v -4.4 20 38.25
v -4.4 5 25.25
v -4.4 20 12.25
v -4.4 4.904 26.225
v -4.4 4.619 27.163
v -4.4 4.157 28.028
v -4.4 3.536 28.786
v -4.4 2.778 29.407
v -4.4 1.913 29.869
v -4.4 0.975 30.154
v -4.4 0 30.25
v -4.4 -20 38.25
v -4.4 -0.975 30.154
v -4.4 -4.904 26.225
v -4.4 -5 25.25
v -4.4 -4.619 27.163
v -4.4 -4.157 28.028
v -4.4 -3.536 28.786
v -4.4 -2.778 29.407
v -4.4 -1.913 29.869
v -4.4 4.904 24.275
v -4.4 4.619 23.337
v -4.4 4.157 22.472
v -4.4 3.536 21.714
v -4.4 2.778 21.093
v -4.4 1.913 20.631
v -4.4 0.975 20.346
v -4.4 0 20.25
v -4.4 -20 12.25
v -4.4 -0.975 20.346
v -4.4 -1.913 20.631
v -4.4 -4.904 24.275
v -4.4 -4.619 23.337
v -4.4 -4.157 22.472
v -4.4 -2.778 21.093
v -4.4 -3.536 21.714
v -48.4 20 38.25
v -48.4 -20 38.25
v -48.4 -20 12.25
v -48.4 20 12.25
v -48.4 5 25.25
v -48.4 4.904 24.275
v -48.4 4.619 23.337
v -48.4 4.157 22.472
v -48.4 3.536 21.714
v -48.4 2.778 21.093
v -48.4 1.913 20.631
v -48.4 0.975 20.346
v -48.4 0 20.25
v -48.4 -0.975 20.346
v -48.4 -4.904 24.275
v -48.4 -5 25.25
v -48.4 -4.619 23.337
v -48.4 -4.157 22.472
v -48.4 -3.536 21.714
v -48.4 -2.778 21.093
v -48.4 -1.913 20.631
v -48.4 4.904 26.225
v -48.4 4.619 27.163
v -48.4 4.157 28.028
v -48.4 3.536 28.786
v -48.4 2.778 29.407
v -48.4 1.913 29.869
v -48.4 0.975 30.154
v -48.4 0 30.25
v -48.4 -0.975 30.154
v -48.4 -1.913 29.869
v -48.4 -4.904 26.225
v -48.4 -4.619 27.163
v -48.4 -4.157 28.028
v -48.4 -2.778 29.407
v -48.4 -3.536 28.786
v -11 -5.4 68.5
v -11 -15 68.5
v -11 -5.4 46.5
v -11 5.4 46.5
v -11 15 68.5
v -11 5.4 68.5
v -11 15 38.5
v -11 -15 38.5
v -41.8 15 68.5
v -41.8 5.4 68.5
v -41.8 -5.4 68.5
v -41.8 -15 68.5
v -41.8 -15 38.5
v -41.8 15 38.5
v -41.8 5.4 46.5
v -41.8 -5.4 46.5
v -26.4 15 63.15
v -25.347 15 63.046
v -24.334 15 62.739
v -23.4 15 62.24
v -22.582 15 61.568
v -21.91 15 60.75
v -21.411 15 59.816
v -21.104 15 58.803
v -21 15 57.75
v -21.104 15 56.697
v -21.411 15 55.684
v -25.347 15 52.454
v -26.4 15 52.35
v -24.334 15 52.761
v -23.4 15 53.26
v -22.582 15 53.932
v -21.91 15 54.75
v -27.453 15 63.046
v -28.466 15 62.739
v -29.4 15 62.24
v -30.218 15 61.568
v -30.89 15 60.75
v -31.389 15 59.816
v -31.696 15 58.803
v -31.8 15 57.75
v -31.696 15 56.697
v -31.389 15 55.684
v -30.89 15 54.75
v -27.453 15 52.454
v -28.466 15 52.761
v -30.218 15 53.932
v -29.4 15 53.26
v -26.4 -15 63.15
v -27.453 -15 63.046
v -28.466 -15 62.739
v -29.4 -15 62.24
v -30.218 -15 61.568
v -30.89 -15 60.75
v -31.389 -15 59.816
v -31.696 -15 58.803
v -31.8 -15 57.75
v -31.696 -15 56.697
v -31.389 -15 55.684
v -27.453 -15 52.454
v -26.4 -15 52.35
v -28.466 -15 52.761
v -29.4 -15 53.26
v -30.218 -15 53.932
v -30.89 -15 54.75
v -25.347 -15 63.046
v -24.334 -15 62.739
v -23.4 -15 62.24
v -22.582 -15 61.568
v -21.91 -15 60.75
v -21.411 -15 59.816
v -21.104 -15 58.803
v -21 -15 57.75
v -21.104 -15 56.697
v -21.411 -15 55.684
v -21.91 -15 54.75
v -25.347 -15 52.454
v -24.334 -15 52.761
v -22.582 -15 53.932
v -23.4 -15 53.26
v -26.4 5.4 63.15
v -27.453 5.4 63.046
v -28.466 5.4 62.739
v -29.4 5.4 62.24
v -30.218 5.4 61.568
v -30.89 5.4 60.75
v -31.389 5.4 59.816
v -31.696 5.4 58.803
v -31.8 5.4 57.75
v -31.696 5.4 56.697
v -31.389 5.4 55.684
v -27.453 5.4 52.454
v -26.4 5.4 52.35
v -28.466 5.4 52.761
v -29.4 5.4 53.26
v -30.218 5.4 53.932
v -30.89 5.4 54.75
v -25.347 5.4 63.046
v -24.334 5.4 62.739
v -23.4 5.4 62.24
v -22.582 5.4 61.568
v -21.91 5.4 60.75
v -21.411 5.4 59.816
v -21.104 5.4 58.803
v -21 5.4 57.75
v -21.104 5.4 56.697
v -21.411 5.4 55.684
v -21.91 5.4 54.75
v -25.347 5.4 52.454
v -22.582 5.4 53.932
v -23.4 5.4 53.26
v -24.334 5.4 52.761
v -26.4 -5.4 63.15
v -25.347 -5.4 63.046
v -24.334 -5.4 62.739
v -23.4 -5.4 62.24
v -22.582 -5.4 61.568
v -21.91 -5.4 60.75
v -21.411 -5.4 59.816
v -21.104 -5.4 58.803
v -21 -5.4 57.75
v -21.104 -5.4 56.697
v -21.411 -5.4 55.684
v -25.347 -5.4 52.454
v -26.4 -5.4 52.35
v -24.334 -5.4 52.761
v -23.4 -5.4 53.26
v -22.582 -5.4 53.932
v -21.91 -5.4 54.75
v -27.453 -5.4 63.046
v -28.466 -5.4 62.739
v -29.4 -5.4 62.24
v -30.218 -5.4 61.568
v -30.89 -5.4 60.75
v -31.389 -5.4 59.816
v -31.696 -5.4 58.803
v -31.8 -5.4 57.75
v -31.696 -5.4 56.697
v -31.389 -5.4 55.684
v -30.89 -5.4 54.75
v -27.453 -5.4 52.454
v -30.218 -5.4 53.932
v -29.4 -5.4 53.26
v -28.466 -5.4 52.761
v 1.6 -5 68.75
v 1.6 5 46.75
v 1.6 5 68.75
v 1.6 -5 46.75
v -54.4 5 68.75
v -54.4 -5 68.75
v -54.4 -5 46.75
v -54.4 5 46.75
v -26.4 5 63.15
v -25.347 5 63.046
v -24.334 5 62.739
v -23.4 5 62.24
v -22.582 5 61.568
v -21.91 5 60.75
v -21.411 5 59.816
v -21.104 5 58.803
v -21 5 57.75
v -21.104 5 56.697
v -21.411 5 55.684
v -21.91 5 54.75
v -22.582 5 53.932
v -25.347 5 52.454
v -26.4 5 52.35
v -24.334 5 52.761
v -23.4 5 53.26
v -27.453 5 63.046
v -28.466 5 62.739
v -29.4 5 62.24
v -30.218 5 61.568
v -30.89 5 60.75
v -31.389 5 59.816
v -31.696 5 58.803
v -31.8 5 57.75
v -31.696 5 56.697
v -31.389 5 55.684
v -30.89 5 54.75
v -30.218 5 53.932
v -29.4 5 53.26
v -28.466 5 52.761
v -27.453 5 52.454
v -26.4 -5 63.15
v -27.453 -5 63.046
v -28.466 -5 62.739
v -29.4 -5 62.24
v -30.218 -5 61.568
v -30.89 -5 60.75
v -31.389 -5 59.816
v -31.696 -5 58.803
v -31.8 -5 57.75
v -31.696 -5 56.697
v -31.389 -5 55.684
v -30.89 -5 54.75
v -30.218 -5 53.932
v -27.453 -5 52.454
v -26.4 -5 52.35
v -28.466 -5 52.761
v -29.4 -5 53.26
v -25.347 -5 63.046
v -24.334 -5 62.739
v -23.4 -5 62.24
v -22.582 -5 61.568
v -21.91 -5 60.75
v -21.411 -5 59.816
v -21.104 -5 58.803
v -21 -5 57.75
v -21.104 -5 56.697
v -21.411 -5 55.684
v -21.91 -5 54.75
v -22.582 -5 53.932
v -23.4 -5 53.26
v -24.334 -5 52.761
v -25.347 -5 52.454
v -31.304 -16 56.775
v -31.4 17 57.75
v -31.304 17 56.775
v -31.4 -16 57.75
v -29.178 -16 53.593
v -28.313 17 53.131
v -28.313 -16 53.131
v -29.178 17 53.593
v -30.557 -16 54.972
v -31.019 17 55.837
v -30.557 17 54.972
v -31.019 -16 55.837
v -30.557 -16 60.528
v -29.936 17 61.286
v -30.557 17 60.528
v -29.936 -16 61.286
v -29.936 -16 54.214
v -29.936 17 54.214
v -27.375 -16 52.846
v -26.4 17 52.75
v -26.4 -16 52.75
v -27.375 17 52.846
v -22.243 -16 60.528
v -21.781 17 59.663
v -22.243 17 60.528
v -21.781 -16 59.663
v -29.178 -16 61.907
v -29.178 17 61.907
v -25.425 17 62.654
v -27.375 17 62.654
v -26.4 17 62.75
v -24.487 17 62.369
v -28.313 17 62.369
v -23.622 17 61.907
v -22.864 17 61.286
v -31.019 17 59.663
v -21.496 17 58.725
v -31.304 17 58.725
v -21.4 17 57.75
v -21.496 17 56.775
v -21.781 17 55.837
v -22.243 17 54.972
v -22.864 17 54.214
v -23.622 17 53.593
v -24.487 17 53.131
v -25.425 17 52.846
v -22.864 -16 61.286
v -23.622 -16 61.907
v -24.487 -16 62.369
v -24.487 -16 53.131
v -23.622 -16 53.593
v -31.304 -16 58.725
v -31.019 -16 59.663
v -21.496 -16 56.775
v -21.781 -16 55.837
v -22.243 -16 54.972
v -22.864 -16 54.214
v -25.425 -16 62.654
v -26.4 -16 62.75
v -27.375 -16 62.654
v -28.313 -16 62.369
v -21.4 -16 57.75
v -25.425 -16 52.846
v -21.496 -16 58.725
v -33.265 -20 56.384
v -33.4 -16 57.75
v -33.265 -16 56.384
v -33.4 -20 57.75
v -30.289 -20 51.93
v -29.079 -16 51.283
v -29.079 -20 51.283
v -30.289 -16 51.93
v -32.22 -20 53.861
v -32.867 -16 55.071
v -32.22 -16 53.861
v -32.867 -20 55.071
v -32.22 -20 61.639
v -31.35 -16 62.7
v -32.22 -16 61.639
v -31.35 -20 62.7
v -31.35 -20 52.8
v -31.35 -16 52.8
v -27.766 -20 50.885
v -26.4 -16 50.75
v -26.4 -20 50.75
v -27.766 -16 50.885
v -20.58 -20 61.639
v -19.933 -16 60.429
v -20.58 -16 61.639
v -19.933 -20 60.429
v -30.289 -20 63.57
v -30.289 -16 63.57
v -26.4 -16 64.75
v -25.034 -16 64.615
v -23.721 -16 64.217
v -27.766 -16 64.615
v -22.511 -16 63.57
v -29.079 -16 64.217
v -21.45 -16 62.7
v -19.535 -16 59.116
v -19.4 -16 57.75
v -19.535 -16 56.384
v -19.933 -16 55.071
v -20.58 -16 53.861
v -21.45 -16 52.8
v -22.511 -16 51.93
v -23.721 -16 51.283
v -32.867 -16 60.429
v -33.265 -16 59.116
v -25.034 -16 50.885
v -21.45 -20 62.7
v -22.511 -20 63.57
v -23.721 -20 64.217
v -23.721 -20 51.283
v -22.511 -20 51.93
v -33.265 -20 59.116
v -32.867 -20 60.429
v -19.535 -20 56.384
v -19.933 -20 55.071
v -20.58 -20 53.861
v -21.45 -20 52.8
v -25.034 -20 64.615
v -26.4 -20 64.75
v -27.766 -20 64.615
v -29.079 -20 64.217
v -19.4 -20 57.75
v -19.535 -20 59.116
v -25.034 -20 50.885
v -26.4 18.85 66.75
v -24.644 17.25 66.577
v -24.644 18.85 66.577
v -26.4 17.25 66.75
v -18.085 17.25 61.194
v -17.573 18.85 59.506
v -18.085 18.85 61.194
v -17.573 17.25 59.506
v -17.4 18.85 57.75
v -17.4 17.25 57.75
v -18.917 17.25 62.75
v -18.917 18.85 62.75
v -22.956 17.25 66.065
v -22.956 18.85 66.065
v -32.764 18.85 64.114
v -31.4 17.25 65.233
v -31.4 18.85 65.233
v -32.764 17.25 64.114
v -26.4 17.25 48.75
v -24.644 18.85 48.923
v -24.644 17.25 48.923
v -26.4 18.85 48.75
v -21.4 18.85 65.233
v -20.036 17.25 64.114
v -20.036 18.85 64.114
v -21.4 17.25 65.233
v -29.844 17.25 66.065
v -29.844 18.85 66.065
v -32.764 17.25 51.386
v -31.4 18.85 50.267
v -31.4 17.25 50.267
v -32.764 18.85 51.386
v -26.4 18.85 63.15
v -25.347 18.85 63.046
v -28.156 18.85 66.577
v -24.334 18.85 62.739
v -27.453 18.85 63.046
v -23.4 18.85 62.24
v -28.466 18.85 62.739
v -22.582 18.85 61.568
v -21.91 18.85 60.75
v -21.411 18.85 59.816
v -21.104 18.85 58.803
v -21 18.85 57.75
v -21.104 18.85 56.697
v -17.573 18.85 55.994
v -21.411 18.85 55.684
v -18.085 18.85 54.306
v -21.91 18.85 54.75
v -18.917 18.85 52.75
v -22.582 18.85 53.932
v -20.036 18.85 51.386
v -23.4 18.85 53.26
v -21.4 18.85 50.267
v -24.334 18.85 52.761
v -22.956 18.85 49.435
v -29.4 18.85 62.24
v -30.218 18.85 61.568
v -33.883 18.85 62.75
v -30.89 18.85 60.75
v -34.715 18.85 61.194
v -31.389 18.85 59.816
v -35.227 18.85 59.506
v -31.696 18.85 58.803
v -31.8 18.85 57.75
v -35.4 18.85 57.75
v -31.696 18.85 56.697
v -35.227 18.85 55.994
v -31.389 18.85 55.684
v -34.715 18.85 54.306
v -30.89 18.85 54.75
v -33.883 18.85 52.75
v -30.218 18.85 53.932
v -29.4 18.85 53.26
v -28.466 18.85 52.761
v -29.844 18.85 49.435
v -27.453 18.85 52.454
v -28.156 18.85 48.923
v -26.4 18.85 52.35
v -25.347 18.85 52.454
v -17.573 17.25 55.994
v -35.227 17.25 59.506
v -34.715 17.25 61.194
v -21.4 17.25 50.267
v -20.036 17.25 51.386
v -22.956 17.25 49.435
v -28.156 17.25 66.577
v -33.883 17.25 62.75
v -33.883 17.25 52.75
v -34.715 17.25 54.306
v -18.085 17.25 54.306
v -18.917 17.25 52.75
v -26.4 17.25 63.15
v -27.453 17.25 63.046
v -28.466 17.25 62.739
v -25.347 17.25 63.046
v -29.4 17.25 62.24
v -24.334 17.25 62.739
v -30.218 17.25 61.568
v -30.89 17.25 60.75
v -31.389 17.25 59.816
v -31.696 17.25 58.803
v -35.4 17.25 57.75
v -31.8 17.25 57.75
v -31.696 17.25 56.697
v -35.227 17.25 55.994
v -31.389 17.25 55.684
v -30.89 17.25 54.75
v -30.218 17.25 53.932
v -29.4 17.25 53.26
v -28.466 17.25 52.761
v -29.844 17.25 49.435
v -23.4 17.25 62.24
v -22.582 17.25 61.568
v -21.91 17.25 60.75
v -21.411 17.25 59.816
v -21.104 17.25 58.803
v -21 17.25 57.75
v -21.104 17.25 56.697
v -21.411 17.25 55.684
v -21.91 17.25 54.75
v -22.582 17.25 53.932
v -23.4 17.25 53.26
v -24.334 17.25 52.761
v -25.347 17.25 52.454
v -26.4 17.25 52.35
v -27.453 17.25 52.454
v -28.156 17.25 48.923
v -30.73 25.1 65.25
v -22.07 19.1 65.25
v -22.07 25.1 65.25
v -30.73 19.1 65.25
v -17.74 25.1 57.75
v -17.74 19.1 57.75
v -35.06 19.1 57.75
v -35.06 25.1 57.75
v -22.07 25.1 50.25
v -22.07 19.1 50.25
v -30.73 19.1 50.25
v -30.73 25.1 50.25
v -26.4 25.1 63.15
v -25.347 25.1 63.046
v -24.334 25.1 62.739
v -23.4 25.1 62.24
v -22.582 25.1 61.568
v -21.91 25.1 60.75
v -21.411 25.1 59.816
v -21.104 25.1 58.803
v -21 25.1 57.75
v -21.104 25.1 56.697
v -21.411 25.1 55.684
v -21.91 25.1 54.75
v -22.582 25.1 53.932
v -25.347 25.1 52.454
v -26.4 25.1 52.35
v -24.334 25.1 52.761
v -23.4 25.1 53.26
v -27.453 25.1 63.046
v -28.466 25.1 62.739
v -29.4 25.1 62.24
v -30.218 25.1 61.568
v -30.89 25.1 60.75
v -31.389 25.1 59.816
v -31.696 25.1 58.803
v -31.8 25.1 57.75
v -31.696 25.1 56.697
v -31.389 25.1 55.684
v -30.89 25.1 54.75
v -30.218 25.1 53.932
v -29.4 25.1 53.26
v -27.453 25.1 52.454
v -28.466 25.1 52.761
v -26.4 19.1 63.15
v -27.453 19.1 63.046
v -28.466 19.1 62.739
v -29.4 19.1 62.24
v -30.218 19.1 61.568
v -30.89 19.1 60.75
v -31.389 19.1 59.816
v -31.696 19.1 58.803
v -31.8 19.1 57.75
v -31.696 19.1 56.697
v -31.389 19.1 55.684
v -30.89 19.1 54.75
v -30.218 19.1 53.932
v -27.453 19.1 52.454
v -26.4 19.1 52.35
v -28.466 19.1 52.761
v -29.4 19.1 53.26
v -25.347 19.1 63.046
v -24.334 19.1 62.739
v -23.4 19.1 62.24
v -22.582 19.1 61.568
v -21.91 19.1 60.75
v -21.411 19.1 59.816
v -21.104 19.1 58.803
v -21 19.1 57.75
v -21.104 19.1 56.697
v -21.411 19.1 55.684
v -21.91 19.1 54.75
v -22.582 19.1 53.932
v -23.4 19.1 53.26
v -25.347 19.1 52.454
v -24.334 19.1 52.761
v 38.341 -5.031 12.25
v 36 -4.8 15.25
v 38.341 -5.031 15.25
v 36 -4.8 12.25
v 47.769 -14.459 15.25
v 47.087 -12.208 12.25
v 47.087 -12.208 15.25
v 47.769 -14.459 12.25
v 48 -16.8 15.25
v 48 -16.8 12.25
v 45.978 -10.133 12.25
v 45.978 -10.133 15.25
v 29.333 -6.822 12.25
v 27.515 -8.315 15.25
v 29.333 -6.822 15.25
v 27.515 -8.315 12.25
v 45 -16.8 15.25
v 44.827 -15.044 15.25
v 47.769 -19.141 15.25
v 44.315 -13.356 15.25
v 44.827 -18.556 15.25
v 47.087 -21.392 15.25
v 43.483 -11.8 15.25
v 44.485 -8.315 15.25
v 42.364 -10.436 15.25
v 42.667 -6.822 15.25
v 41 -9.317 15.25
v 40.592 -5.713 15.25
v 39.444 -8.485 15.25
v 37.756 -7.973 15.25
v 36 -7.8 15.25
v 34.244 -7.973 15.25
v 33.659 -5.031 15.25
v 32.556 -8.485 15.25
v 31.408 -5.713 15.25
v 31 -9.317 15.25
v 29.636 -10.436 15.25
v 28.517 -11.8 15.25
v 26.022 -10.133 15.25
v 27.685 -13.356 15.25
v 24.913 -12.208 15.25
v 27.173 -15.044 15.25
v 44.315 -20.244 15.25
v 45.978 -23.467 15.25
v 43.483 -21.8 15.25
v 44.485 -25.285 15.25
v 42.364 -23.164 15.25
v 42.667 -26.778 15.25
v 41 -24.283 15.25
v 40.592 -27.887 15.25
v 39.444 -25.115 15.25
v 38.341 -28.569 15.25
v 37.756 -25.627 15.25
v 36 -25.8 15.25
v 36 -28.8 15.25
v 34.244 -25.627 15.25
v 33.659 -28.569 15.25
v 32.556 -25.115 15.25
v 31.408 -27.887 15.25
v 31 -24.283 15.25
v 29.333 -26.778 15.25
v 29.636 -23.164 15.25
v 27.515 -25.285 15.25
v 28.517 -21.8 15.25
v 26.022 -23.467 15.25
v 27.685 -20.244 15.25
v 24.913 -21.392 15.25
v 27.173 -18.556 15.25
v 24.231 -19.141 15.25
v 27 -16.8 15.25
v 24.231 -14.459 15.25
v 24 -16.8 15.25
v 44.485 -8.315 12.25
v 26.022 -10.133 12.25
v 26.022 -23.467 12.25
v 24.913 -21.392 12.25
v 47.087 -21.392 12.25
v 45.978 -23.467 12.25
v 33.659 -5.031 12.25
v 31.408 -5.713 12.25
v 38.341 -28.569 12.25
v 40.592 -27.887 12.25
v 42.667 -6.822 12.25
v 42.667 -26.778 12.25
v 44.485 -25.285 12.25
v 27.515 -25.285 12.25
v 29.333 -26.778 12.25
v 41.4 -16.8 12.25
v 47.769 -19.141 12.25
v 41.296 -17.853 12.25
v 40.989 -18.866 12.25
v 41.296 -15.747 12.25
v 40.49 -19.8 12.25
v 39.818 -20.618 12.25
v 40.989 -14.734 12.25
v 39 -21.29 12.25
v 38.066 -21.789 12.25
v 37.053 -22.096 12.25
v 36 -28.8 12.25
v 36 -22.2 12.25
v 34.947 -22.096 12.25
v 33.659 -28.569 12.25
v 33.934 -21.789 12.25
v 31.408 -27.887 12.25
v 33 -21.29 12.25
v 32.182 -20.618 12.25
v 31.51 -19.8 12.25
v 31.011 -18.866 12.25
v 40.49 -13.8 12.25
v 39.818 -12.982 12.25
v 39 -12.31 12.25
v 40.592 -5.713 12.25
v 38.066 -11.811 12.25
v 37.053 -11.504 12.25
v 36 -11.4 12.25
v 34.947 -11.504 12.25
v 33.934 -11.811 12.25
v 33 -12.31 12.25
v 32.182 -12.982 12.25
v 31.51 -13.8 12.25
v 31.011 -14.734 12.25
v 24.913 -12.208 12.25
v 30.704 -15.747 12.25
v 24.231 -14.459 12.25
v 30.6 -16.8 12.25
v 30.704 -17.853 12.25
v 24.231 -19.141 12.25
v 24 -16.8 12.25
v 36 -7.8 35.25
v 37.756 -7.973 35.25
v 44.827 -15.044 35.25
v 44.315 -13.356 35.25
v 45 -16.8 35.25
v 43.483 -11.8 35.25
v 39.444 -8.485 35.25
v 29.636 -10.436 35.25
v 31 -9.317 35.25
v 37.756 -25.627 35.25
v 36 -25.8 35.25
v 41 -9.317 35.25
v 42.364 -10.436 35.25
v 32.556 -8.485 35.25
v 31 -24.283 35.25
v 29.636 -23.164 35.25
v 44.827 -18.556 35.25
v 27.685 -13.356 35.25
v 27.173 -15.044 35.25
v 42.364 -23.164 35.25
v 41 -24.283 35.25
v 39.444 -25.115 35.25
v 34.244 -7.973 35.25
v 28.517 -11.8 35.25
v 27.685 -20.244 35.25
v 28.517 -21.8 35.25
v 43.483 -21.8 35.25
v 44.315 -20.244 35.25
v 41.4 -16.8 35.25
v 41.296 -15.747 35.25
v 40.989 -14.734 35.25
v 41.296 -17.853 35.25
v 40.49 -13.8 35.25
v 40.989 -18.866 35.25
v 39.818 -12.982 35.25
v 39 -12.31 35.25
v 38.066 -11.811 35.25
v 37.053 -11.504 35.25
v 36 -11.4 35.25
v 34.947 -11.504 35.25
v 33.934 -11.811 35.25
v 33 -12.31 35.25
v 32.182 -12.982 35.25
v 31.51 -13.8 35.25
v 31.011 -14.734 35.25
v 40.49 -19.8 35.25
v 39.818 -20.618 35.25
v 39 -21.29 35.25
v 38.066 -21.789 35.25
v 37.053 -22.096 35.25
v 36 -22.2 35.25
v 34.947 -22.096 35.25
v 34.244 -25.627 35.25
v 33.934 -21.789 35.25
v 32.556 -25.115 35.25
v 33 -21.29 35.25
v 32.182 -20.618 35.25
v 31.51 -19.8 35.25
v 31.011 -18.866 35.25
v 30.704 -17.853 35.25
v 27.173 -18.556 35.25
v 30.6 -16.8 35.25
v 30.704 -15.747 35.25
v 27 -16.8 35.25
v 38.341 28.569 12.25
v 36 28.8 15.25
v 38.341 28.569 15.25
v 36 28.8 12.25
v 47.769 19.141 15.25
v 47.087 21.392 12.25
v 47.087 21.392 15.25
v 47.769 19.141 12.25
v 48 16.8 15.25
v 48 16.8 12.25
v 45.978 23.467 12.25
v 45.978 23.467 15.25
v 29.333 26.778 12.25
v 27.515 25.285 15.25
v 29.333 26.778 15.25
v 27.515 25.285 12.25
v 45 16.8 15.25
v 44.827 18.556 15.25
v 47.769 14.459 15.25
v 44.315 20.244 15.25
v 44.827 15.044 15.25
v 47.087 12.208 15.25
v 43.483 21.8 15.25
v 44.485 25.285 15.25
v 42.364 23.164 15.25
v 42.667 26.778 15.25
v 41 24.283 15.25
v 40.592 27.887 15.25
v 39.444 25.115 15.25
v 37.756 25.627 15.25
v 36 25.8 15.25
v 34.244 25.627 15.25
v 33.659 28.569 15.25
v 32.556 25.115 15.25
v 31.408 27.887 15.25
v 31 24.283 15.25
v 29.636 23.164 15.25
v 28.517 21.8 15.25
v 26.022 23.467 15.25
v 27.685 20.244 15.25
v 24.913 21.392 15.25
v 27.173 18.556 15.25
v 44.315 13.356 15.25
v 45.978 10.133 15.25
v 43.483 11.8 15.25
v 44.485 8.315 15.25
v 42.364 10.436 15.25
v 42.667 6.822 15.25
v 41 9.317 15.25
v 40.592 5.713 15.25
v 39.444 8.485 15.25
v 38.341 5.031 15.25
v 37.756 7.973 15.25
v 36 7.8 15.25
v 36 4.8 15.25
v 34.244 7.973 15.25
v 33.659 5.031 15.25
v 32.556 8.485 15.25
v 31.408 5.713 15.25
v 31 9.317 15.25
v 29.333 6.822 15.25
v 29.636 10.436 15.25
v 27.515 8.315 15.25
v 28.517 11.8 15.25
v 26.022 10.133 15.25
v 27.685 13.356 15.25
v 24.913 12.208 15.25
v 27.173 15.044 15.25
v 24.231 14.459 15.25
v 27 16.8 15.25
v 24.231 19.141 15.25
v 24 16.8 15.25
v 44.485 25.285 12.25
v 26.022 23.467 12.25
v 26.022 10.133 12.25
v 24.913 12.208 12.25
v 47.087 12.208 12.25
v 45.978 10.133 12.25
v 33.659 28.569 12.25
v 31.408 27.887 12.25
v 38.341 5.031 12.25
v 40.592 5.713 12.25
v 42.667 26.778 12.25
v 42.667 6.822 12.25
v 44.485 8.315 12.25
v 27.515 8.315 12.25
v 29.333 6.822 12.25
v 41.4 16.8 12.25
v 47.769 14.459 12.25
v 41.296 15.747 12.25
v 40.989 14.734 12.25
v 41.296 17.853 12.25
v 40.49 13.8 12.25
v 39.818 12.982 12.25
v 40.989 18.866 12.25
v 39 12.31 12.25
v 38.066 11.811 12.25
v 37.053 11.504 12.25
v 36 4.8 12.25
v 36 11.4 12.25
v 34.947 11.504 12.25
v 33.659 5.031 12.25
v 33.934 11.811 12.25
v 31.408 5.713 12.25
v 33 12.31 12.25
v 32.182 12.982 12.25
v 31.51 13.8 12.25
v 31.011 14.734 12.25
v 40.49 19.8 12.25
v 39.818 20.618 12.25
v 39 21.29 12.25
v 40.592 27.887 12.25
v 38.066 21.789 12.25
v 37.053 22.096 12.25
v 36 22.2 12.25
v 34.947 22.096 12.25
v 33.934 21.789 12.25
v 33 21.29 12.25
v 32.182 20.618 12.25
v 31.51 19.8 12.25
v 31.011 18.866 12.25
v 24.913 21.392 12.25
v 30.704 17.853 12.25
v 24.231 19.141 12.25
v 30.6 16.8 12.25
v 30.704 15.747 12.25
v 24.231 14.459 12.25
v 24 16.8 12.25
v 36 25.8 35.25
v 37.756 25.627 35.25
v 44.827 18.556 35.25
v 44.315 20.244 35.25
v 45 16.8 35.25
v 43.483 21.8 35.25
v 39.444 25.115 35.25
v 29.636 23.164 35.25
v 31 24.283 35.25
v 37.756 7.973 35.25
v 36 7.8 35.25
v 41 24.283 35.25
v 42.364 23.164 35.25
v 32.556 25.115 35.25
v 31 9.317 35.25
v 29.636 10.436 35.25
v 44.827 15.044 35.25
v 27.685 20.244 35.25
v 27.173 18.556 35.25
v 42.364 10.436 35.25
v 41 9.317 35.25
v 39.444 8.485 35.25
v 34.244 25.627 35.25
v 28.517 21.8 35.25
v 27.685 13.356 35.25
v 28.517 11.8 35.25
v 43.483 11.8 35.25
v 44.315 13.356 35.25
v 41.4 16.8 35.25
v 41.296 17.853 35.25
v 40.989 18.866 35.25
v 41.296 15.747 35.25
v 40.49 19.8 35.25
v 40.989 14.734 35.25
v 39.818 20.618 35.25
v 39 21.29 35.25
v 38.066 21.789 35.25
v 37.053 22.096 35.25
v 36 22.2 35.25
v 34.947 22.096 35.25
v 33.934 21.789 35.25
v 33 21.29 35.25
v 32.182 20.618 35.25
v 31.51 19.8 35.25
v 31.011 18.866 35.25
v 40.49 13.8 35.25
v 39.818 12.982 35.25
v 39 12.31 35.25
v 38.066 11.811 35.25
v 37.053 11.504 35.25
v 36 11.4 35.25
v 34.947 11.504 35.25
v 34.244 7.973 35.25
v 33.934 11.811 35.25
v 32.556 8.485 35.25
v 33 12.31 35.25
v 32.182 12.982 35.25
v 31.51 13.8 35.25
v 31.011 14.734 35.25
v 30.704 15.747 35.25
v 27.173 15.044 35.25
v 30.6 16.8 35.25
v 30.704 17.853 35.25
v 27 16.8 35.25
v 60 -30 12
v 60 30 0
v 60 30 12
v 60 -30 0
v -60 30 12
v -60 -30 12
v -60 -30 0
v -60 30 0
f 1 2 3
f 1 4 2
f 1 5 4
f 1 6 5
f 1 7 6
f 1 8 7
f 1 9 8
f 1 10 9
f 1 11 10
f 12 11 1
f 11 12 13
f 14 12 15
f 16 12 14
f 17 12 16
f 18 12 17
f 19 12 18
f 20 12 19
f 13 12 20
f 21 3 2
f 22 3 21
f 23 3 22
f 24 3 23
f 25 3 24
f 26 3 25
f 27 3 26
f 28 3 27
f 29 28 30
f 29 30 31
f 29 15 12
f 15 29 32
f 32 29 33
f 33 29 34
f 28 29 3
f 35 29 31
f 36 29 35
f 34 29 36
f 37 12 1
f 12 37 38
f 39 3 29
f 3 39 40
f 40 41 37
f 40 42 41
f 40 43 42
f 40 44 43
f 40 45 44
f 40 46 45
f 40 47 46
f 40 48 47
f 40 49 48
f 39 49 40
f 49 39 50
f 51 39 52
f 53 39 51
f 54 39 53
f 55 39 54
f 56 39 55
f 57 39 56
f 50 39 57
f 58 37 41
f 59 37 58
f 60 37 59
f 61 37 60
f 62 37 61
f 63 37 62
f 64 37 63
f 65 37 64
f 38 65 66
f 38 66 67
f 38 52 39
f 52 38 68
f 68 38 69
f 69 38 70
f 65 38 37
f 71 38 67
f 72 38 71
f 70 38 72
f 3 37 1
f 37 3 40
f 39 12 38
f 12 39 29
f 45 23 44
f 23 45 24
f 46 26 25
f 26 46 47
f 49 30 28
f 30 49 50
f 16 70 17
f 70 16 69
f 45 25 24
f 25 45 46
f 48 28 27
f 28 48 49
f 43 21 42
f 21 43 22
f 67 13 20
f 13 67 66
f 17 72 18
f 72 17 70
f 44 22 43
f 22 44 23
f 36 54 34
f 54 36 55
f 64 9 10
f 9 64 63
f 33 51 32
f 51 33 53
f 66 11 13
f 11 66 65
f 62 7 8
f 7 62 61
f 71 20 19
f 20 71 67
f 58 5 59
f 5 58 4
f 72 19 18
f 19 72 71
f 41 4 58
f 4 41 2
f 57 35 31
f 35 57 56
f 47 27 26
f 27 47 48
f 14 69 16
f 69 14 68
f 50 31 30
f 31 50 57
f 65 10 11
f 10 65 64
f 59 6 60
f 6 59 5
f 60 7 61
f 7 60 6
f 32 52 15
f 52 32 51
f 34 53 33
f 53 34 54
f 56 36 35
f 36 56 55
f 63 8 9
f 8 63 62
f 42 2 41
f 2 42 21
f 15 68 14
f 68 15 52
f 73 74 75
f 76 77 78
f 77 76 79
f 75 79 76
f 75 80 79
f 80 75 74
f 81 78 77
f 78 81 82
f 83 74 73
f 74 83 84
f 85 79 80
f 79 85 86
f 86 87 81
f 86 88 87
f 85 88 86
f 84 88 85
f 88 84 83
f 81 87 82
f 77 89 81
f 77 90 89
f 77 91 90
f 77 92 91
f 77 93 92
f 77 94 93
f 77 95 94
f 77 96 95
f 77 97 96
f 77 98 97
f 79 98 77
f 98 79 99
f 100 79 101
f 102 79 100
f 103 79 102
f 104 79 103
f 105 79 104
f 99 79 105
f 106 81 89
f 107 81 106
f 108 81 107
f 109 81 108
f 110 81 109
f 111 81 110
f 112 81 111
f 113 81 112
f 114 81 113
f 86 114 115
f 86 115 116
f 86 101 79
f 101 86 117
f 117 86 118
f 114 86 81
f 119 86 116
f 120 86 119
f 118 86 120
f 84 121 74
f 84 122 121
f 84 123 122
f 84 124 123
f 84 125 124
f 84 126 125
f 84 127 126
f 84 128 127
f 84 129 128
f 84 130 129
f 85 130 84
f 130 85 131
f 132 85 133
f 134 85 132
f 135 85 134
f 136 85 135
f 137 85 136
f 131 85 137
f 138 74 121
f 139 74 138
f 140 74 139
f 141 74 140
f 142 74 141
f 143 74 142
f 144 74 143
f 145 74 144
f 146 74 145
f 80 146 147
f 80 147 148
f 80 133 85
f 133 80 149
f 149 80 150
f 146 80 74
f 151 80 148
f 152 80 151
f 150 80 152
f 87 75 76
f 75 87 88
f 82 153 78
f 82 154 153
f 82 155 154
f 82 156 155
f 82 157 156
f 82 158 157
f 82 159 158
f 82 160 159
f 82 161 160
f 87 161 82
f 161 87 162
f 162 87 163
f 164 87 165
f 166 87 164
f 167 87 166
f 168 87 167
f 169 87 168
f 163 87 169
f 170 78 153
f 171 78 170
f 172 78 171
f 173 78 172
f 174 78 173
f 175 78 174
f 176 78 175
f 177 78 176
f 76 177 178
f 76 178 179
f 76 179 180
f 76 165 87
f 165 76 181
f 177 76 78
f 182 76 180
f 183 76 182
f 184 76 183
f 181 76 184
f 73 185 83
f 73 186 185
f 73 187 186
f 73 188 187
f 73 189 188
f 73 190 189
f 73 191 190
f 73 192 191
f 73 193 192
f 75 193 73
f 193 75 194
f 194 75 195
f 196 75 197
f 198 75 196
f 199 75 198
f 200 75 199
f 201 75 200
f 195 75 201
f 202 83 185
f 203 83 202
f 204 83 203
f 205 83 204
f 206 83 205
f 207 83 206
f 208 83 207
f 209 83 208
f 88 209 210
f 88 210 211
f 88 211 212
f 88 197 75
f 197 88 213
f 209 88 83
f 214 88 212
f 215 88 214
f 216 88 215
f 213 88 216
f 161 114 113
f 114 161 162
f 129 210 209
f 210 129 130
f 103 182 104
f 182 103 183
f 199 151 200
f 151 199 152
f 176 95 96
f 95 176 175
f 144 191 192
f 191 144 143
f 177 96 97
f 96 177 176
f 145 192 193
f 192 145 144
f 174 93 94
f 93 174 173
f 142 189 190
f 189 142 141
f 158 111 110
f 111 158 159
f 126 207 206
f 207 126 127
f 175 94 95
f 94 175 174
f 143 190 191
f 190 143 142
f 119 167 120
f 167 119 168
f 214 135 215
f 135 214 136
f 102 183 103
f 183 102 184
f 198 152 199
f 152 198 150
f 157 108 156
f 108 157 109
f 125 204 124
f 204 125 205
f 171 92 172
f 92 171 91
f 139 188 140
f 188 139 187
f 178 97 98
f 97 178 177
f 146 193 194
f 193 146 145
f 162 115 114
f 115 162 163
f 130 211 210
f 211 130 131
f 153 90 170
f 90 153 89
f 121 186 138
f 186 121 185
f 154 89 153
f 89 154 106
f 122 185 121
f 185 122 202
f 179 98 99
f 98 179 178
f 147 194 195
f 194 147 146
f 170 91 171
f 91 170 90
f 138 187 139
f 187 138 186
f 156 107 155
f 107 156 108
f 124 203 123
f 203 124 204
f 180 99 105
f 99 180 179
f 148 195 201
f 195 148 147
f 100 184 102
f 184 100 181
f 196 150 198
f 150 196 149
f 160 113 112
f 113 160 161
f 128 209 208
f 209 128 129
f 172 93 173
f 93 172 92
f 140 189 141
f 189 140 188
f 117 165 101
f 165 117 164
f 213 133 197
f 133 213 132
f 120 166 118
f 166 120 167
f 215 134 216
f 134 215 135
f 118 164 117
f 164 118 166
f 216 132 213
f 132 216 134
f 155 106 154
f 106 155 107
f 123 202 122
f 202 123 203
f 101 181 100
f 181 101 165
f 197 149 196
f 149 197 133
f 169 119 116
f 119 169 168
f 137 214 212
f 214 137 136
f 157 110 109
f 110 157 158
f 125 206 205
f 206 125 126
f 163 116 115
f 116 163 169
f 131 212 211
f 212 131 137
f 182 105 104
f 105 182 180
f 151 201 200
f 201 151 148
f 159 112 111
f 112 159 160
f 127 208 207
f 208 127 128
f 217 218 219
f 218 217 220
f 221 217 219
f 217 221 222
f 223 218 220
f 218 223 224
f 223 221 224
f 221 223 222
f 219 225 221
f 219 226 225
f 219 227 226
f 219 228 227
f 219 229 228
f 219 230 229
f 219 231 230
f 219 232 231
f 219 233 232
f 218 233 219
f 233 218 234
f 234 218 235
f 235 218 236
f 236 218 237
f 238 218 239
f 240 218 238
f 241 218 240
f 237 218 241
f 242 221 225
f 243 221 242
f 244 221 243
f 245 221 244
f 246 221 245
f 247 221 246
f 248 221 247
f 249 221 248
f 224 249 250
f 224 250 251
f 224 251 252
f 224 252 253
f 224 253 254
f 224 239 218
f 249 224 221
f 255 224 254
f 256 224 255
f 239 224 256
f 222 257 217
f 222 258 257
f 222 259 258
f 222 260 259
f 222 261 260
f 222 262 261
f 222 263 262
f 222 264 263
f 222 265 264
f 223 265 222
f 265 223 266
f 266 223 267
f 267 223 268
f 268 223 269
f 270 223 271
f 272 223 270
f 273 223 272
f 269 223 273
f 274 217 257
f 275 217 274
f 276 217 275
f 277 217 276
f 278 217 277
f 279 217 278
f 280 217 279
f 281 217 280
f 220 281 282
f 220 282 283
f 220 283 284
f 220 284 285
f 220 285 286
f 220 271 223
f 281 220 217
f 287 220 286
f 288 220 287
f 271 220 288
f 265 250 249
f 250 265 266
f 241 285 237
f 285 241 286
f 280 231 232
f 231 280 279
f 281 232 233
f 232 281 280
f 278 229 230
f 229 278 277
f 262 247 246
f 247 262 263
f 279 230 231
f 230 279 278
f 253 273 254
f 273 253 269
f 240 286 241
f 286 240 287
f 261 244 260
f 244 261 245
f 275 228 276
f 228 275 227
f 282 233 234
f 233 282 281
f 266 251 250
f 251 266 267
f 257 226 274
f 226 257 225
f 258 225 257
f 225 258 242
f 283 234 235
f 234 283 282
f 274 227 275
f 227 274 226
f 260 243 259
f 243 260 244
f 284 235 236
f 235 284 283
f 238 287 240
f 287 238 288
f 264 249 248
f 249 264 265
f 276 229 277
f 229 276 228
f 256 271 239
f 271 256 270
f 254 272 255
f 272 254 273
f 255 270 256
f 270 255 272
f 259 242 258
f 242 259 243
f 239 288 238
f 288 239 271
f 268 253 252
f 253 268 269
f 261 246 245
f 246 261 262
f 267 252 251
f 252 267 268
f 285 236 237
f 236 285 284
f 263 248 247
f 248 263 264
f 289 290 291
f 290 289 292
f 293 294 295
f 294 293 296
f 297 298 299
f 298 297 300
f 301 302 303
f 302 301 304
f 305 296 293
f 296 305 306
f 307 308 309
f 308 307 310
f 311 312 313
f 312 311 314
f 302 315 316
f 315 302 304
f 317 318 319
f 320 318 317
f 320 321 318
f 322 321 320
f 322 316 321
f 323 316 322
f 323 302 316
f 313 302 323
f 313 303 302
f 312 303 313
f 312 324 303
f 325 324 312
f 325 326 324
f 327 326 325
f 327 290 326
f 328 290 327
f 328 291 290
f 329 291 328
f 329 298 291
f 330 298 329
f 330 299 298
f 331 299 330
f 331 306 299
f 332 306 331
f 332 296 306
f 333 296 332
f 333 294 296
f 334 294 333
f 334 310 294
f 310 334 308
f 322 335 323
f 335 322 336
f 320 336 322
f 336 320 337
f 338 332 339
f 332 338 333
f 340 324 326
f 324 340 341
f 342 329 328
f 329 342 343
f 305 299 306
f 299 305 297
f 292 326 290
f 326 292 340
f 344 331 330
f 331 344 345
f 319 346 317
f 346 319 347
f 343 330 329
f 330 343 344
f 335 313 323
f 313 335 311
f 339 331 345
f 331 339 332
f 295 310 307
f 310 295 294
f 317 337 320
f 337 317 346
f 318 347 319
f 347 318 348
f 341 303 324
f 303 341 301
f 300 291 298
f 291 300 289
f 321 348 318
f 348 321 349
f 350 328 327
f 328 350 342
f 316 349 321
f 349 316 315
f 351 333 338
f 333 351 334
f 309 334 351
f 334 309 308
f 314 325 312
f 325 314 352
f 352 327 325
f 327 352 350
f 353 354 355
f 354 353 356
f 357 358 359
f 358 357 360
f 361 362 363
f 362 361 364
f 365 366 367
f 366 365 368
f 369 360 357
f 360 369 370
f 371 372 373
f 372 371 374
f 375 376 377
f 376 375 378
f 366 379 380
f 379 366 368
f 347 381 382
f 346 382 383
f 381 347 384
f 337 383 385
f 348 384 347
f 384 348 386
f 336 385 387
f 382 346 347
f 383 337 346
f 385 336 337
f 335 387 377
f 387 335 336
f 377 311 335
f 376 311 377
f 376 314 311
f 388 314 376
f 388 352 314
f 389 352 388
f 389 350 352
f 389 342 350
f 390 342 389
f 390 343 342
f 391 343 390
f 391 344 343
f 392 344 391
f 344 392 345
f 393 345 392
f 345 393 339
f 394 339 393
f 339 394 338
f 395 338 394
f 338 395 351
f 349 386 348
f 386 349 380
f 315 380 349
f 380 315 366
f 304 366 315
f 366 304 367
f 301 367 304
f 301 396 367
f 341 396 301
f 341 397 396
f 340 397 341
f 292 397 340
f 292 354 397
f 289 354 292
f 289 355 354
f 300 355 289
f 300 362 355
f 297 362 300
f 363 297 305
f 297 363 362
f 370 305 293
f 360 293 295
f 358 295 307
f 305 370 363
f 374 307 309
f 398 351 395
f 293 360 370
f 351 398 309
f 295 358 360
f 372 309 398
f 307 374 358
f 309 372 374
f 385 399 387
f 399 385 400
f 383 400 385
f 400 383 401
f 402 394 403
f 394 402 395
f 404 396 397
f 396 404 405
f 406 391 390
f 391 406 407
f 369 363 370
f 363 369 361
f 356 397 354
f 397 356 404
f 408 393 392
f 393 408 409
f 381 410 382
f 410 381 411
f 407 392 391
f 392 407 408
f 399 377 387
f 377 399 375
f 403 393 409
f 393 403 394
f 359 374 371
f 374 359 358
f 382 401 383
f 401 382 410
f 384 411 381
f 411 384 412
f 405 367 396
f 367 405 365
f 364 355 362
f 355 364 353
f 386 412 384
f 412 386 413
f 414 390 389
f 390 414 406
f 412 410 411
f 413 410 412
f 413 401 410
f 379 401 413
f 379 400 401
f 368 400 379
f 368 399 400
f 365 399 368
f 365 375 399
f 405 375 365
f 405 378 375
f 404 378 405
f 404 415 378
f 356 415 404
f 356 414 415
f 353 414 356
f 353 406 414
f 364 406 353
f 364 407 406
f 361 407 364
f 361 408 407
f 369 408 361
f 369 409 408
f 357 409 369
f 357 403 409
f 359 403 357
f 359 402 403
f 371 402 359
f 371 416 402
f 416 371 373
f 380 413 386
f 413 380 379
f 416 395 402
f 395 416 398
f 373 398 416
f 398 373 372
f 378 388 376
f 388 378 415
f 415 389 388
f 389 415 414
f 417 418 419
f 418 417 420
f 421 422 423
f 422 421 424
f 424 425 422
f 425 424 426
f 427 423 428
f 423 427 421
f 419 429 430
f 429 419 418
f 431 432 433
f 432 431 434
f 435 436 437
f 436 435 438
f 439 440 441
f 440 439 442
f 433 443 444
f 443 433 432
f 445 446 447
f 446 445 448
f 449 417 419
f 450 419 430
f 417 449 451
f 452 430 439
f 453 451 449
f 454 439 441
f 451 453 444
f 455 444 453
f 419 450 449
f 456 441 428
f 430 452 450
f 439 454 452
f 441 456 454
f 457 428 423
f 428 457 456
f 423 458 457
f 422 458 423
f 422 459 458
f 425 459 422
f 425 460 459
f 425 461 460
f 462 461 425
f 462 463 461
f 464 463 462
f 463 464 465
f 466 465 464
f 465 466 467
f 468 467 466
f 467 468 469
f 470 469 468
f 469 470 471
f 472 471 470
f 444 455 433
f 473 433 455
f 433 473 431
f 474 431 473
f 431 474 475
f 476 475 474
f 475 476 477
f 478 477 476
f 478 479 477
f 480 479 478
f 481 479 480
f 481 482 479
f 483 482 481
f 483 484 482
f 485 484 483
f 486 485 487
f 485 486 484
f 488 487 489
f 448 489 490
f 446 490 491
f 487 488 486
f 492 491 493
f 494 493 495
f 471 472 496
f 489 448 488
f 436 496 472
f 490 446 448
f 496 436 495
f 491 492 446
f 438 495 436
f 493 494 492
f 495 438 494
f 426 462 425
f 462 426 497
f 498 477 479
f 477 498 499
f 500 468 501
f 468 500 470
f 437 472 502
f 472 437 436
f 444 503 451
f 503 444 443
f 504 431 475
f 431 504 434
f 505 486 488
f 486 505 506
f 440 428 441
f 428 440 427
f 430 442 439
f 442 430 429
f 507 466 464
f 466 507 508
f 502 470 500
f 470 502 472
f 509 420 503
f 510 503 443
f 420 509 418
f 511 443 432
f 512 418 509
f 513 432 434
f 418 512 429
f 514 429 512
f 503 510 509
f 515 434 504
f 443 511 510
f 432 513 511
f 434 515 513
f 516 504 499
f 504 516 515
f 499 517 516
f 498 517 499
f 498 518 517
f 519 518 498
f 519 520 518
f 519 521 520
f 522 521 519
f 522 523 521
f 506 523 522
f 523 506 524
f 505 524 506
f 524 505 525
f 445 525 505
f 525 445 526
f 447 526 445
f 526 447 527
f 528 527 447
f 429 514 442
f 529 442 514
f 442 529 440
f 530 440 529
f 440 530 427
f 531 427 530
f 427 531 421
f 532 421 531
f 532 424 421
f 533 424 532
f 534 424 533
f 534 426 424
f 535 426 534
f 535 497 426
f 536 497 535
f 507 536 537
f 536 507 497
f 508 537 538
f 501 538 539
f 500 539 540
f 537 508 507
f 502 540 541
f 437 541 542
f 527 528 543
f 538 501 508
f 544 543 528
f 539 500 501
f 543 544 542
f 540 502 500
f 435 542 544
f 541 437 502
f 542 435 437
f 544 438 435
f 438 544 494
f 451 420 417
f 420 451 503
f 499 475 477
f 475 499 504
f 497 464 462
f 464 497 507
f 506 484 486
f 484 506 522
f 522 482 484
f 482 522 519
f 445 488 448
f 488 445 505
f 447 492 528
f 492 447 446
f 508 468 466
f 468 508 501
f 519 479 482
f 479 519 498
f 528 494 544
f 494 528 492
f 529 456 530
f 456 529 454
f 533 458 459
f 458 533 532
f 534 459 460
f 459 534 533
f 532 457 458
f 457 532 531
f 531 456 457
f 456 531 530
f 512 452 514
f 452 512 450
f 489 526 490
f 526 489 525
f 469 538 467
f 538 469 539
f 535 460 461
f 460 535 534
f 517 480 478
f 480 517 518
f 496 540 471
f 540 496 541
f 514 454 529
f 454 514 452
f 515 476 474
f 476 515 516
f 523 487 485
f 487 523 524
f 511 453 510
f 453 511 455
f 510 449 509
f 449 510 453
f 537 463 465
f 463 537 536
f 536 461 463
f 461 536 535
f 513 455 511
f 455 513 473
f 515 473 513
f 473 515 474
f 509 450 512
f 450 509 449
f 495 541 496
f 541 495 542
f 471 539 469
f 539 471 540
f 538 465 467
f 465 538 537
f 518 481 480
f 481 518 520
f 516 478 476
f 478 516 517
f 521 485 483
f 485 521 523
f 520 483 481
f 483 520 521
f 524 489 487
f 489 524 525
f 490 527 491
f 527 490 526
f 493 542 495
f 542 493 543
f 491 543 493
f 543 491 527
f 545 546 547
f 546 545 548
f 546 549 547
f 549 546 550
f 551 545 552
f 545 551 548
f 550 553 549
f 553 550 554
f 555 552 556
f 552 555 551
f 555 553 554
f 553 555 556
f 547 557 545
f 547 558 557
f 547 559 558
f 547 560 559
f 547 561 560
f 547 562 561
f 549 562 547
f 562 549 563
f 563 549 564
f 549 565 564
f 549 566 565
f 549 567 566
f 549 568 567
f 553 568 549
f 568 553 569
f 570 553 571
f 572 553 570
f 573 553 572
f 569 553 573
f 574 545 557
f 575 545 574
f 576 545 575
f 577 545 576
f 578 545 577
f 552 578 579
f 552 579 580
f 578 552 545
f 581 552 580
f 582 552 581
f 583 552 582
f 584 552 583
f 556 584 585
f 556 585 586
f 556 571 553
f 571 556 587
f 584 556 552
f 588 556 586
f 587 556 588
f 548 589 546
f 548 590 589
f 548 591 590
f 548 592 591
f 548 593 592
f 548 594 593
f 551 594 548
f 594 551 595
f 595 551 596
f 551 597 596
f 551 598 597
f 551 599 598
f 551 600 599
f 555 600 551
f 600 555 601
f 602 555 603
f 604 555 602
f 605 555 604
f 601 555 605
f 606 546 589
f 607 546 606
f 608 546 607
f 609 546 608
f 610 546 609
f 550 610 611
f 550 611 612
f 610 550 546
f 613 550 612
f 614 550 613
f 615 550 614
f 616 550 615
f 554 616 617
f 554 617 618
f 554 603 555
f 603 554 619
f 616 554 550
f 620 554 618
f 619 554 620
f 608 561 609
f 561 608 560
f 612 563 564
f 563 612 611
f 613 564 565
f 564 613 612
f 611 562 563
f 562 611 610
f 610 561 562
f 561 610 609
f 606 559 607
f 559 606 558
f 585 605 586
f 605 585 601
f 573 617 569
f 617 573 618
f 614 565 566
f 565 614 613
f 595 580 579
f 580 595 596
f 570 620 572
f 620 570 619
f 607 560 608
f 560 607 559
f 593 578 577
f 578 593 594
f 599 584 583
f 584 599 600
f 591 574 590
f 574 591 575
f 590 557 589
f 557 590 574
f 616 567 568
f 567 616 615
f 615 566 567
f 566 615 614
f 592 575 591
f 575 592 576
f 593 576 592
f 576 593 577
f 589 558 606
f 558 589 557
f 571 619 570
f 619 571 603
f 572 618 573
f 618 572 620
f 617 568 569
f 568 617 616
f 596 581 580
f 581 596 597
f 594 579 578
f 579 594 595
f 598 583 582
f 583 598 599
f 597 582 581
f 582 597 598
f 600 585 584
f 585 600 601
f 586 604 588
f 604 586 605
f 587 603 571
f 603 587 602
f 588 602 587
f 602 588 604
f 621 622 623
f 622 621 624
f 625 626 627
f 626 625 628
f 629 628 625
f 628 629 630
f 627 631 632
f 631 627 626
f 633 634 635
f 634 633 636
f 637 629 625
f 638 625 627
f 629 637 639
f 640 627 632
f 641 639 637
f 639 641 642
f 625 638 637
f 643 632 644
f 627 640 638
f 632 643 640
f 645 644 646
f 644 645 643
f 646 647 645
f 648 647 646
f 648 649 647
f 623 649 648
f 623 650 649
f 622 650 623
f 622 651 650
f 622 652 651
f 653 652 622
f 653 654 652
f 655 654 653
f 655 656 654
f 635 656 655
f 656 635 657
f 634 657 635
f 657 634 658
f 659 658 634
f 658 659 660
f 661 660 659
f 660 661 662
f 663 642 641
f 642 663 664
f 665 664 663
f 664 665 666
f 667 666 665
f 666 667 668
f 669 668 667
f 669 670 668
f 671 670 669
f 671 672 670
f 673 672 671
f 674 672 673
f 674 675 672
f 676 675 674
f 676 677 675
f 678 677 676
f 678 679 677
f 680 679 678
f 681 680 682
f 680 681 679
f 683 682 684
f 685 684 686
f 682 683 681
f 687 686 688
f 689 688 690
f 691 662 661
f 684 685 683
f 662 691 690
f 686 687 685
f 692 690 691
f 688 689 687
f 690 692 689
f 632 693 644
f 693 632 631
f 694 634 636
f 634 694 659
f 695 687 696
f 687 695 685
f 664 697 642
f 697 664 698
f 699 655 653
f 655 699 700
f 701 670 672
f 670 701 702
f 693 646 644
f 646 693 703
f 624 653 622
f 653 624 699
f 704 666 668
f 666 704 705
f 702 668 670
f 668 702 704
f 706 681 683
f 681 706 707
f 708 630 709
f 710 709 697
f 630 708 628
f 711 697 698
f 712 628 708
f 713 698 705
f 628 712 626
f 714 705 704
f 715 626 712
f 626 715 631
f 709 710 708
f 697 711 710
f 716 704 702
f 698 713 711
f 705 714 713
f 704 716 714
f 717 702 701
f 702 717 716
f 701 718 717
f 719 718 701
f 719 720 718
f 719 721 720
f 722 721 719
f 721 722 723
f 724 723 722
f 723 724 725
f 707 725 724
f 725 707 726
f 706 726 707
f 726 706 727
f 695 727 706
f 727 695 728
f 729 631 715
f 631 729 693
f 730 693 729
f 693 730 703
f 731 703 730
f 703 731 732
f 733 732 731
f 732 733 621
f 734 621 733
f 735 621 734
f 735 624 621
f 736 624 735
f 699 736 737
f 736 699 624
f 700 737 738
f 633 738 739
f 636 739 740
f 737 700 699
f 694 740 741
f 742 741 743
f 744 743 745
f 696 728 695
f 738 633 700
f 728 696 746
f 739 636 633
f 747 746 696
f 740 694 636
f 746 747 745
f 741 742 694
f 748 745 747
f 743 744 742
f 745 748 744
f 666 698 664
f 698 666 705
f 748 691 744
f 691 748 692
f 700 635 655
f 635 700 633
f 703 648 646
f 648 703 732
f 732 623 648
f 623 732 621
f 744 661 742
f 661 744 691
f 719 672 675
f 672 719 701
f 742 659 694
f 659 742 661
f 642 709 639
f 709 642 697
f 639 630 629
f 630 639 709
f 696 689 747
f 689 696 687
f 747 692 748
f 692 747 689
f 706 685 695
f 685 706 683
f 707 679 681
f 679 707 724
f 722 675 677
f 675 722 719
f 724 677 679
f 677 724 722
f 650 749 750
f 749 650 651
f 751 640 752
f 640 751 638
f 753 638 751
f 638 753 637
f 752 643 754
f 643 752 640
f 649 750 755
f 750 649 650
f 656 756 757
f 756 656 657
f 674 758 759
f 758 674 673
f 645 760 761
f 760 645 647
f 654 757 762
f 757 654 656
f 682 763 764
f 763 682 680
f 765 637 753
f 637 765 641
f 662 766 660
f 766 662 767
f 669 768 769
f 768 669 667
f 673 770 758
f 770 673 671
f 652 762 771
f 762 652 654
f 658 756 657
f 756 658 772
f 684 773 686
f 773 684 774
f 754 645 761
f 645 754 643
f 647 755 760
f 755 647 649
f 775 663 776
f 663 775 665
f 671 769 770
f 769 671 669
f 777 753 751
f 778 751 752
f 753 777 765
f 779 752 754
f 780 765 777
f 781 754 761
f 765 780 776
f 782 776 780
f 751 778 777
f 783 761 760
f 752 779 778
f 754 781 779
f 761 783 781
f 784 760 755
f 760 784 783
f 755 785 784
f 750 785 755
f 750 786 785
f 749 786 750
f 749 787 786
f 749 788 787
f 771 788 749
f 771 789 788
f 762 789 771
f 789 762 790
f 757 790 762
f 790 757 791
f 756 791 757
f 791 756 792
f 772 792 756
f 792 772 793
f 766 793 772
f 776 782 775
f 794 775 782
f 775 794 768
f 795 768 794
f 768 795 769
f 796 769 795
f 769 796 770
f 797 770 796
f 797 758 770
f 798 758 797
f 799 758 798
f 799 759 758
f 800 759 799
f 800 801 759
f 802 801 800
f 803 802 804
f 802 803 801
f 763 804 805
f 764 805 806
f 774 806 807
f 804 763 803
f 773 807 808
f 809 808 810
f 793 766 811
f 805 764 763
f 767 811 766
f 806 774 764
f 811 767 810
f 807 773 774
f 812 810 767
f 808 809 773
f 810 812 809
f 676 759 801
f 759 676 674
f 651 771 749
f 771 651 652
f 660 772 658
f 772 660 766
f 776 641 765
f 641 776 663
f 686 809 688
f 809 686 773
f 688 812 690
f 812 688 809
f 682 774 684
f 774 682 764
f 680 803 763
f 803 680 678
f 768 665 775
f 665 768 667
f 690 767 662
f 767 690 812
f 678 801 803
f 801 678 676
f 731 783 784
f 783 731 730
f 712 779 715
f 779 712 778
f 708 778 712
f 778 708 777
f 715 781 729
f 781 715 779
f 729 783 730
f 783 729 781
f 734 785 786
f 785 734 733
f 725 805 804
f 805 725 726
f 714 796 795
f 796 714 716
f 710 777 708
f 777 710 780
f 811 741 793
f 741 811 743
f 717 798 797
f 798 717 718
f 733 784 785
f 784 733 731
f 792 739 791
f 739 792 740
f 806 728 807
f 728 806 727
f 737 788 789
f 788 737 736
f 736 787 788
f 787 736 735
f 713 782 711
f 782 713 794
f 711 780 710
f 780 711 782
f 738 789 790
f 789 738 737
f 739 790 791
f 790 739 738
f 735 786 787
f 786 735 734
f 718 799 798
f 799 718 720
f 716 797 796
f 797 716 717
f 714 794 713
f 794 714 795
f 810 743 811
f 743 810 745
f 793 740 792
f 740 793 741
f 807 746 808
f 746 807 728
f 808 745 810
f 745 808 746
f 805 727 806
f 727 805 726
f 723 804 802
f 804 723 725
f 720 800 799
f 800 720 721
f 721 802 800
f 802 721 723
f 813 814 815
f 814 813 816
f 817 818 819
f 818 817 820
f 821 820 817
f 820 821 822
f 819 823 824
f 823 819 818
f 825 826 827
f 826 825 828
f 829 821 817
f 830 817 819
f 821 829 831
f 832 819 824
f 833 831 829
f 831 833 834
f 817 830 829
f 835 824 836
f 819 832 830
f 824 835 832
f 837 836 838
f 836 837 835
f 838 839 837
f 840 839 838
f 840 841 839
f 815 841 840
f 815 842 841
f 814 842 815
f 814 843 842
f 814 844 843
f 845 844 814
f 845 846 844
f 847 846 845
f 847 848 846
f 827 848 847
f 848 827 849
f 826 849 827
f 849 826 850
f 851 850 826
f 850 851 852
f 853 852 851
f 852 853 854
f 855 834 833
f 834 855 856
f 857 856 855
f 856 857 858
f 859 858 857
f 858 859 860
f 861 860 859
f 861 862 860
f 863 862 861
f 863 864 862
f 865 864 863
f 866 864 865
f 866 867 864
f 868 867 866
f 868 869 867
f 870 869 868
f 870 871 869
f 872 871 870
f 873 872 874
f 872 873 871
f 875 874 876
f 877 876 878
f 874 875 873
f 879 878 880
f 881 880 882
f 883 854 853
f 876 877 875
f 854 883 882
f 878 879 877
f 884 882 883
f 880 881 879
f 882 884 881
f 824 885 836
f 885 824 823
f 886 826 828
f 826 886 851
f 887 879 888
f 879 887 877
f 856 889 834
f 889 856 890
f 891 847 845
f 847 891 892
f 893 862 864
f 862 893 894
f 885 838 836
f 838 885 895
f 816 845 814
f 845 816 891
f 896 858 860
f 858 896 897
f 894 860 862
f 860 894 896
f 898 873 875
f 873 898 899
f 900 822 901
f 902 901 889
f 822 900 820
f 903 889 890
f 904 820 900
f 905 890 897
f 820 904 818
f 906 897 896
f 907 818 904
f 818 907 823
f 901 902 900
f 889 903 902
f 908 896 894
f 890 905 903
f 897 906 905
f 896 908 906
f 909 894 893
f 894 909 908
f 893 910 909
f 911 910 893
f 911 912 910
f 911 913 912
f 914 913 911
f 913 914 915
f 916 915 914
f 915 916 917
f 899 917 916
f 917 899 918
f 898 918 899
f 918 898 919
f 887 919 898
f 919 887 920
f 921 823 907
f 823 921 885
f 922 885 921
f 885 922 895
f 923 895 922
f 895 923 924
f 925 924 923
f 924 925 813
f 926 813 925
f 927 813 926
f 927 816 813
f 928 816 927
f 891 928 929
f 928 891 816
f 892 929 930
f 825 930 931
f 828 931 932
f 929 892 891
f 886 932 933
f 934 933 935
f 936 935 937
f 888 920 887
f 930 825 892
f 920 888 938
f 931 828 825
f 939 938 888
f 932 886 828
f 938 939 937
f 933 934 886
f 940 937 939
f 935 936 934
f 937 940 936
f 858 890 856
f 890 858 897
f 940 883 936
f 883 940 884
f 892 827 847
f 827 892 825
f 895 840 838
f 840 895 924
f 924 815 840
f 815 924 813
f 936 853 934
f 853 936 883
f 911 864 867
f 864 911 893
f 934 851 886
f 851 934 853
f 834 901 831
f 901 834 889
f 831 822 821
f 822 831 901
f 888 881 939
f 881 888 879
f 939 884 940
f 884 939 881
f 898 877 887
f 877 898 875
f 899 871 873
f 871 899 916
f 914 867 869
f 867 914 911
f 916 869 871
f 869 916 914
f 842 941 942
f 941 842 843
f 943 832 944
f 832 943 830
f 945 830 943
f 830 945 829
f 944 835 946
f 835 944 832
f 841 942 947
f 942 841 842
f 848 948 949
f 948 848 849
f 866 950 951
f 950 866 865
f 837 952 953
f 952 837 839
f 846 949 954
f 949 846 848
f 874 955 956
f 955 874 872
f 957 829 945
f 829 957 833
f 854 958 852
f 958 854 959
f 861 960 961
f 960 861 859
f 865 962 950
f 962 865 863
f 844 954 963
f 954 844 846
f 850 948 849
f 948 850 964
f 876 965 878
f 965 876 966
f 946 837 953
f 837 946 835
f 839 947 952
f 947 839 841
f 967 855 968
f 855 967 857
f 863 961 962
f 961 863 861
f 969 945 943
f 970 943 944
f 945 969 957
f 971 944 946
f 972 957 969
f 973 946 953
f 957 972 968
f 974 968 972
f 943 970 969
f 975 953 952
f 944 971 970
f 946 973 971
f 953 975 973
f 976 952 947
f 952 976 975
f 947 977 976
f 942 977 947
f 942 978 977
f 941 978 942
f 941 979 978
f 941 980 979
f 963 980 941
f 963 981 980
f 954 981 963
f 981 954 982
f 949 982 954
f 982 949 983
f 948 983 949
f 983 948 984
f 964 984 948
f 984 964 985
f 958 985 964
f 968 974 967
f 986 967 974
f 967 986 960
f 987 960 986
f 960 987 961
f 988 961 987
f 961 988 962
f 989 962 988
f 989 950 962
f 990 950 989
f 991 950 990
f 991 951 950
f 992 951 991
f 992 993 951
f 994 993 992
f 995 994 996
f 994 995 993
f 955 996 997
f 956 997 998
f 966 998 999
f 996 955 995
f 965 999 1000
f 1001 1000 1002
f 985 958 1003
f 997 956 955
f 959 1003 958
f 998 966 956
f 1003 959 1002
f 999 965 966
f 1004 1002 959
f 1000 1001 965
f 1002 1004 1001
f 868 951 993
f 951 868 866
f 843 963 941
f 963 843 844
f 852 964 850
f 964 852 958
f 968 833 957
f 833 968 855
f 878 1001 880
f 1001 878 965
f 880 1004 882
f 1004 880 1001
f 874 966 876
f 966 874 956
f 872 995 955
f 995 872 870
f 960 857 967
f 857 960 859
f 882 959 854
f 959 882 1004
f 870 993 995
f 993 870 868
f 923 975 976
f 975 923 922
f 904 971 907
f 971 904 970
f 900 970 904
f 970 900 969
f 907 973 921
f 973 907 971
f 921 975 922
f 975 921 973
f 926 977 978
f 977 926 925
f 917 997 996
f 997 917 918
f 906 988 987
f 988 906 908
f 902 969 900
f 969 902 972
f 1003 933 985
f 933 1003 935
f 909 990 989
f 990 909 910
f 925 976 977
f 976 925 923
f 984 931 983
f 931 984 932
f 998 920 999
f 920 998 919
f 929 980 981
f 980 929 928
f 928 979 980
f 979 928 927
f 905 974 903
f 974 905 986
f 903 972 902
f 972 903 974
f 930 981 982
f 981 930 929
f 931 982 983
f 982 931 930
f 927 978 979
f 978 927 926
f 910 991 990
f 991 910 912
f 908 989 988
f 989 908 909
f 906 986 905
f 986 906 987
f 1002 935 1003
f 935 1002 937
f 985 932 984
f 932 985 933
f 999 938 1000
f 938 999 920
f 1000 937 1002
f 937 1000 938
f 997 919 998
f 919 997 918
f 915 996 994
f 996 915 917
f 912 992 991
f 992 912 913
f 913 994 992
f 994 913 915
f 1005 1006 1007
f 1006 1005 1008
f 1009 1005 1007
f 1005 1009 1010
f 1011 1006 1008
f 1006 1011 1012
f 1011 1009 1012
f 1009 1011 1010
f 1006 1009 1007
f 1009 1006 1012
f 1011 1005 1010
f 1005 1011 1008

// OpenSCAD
$fn = 32;

// ------------------------------------------------------------------------
// Indexing jig: plate 120 x 60 mm, pin d10
// Every part is its own module, assembly() places every instance.
// ------------------------------------------------------------------------

// --- part 1 ---
module jig_plate() {
  difference() {
    translate([-60, -30, 0]) cube([120, 60, 12]);
  }
}

// --- part 2 ---
module locator_block() {
  difference() {
    translate([-22, -20, 0]) cube([44, 40, 26]);
    translate([0, 0, 13]) rotate([0, 90, 0]) cylinder(h = 46, d = 10, center = true);
  }
}

// --- part 3 ---
module index_fork() {
  difference() {
    translate([-15.4, -15, 0]) cube([30.8, 30, 30]);
    translate([-16.4, -5.4, 8]) cube([32.8, 10.8, 23]);
    translate([0, 0, 19.25]) rotate([90, 0, 0]) cylinder(h = 32, d = 10.8, center = true);
  }
}

// --- part 4 ---
module index_arm() {
  difference() {
    translate([-28, -5, 0]) cube([56, 10, 22]);
    translate([0, 0, 11]) rotate([90, 0, 0]) cylinder(h = 12, d = 10.8, center = true);
  }
}

// --- part 5 ---
module index_pin() {
  rotate([0, 90, 0]) cylinder(h = 34, d = 10, center = true);
  translate([-20, 0, 0]) rotate([0, 90, 0]) cylinder(h = 4, d = 14);
}

// --- part 6 ---
module pin_washer() {
  difference() {
      translate([0, 0, 0]) cylinder(h = 1.6, d = 18);
      translate([0, 0, -1]) cylinder(h = 3.6, d = 10.8);
    }
}

// --- part 7 ---
module lock_nut() {
  difference() {
    linear_extrude(height = 6) polygon(points = [[8.66, 0], [4.33, 7.5], [-4.33, 7.5], [-8.66, 0], [-4.33, -7.5], [4.33, -7.5]]);
    translate([0, 0, -1]) cylinder(h = 8, d = 10.8);
  }
}

// --- part 8 ---
module guide_bush_a() {
  difference() {
    union() {
      cylinder(h = 3, d = 24);
      translate([0, 0, 3]) cylinder(h = 20, d = 18);
    }
    translate([0, 0, -1]) cylinder(h = 25, d = 10.8);
  }
}

// --- part 9 ---
module guide_bush_b() {
  difference() {
    union() {
      cylinder(h = 3, d = 24);
      translate([0, 0, 3]) cylinder(h = 20, d = 18);
    }
    translate([0, 0, -1]) cylinder(h = 25, d = 10.8);
  }
}

// --- assembly ---
module assembly() {
  color([0.80, 0.24, 0.20]) translate([0, 0, 0]) rotate([0, 0, 0]) jig_plate();
  color([0.20, 0.45, 0.75]) translate([-26.4, 0, 12.25]) rotate([0, 0, 0]) locator_block();
  color([0.25, 0.62, 0.32]) translate([-26.4, 0, 38.5]) rotate([0, 0, 0]) index_fork();
  color([0.92, 0.70, 0.18]) translate([-26.4, 0, 46.75]) rotate([0, 0, 0]) index_arm();
  color([0.58, 0.35, 0.70]) translate([-26.4, 0, 57.75]) rotate([0, 0, 90]) index_pin();
  color([0.16, 0.66, 0.66]) translate([-26.4, 18.85, 57.75]) rotate([90, 0, 0]) pin_washer();
  color([0.85, 0.48, 0.18]) translate([-26.4, 25.1, 57.75]) rotate([90, 0, 0]) lock_nut();
  color([0.55, 0.60, 0.65]) translate([36, -16.8, 12.25]) rotate([0, 0, 0]) guide_bush_a();
  color([0.75, 0.30, 0.55]) translate([36, 16.8, 12.25]) rotate([0, 0, 0]) guide_bush_b();
}

assembly();
